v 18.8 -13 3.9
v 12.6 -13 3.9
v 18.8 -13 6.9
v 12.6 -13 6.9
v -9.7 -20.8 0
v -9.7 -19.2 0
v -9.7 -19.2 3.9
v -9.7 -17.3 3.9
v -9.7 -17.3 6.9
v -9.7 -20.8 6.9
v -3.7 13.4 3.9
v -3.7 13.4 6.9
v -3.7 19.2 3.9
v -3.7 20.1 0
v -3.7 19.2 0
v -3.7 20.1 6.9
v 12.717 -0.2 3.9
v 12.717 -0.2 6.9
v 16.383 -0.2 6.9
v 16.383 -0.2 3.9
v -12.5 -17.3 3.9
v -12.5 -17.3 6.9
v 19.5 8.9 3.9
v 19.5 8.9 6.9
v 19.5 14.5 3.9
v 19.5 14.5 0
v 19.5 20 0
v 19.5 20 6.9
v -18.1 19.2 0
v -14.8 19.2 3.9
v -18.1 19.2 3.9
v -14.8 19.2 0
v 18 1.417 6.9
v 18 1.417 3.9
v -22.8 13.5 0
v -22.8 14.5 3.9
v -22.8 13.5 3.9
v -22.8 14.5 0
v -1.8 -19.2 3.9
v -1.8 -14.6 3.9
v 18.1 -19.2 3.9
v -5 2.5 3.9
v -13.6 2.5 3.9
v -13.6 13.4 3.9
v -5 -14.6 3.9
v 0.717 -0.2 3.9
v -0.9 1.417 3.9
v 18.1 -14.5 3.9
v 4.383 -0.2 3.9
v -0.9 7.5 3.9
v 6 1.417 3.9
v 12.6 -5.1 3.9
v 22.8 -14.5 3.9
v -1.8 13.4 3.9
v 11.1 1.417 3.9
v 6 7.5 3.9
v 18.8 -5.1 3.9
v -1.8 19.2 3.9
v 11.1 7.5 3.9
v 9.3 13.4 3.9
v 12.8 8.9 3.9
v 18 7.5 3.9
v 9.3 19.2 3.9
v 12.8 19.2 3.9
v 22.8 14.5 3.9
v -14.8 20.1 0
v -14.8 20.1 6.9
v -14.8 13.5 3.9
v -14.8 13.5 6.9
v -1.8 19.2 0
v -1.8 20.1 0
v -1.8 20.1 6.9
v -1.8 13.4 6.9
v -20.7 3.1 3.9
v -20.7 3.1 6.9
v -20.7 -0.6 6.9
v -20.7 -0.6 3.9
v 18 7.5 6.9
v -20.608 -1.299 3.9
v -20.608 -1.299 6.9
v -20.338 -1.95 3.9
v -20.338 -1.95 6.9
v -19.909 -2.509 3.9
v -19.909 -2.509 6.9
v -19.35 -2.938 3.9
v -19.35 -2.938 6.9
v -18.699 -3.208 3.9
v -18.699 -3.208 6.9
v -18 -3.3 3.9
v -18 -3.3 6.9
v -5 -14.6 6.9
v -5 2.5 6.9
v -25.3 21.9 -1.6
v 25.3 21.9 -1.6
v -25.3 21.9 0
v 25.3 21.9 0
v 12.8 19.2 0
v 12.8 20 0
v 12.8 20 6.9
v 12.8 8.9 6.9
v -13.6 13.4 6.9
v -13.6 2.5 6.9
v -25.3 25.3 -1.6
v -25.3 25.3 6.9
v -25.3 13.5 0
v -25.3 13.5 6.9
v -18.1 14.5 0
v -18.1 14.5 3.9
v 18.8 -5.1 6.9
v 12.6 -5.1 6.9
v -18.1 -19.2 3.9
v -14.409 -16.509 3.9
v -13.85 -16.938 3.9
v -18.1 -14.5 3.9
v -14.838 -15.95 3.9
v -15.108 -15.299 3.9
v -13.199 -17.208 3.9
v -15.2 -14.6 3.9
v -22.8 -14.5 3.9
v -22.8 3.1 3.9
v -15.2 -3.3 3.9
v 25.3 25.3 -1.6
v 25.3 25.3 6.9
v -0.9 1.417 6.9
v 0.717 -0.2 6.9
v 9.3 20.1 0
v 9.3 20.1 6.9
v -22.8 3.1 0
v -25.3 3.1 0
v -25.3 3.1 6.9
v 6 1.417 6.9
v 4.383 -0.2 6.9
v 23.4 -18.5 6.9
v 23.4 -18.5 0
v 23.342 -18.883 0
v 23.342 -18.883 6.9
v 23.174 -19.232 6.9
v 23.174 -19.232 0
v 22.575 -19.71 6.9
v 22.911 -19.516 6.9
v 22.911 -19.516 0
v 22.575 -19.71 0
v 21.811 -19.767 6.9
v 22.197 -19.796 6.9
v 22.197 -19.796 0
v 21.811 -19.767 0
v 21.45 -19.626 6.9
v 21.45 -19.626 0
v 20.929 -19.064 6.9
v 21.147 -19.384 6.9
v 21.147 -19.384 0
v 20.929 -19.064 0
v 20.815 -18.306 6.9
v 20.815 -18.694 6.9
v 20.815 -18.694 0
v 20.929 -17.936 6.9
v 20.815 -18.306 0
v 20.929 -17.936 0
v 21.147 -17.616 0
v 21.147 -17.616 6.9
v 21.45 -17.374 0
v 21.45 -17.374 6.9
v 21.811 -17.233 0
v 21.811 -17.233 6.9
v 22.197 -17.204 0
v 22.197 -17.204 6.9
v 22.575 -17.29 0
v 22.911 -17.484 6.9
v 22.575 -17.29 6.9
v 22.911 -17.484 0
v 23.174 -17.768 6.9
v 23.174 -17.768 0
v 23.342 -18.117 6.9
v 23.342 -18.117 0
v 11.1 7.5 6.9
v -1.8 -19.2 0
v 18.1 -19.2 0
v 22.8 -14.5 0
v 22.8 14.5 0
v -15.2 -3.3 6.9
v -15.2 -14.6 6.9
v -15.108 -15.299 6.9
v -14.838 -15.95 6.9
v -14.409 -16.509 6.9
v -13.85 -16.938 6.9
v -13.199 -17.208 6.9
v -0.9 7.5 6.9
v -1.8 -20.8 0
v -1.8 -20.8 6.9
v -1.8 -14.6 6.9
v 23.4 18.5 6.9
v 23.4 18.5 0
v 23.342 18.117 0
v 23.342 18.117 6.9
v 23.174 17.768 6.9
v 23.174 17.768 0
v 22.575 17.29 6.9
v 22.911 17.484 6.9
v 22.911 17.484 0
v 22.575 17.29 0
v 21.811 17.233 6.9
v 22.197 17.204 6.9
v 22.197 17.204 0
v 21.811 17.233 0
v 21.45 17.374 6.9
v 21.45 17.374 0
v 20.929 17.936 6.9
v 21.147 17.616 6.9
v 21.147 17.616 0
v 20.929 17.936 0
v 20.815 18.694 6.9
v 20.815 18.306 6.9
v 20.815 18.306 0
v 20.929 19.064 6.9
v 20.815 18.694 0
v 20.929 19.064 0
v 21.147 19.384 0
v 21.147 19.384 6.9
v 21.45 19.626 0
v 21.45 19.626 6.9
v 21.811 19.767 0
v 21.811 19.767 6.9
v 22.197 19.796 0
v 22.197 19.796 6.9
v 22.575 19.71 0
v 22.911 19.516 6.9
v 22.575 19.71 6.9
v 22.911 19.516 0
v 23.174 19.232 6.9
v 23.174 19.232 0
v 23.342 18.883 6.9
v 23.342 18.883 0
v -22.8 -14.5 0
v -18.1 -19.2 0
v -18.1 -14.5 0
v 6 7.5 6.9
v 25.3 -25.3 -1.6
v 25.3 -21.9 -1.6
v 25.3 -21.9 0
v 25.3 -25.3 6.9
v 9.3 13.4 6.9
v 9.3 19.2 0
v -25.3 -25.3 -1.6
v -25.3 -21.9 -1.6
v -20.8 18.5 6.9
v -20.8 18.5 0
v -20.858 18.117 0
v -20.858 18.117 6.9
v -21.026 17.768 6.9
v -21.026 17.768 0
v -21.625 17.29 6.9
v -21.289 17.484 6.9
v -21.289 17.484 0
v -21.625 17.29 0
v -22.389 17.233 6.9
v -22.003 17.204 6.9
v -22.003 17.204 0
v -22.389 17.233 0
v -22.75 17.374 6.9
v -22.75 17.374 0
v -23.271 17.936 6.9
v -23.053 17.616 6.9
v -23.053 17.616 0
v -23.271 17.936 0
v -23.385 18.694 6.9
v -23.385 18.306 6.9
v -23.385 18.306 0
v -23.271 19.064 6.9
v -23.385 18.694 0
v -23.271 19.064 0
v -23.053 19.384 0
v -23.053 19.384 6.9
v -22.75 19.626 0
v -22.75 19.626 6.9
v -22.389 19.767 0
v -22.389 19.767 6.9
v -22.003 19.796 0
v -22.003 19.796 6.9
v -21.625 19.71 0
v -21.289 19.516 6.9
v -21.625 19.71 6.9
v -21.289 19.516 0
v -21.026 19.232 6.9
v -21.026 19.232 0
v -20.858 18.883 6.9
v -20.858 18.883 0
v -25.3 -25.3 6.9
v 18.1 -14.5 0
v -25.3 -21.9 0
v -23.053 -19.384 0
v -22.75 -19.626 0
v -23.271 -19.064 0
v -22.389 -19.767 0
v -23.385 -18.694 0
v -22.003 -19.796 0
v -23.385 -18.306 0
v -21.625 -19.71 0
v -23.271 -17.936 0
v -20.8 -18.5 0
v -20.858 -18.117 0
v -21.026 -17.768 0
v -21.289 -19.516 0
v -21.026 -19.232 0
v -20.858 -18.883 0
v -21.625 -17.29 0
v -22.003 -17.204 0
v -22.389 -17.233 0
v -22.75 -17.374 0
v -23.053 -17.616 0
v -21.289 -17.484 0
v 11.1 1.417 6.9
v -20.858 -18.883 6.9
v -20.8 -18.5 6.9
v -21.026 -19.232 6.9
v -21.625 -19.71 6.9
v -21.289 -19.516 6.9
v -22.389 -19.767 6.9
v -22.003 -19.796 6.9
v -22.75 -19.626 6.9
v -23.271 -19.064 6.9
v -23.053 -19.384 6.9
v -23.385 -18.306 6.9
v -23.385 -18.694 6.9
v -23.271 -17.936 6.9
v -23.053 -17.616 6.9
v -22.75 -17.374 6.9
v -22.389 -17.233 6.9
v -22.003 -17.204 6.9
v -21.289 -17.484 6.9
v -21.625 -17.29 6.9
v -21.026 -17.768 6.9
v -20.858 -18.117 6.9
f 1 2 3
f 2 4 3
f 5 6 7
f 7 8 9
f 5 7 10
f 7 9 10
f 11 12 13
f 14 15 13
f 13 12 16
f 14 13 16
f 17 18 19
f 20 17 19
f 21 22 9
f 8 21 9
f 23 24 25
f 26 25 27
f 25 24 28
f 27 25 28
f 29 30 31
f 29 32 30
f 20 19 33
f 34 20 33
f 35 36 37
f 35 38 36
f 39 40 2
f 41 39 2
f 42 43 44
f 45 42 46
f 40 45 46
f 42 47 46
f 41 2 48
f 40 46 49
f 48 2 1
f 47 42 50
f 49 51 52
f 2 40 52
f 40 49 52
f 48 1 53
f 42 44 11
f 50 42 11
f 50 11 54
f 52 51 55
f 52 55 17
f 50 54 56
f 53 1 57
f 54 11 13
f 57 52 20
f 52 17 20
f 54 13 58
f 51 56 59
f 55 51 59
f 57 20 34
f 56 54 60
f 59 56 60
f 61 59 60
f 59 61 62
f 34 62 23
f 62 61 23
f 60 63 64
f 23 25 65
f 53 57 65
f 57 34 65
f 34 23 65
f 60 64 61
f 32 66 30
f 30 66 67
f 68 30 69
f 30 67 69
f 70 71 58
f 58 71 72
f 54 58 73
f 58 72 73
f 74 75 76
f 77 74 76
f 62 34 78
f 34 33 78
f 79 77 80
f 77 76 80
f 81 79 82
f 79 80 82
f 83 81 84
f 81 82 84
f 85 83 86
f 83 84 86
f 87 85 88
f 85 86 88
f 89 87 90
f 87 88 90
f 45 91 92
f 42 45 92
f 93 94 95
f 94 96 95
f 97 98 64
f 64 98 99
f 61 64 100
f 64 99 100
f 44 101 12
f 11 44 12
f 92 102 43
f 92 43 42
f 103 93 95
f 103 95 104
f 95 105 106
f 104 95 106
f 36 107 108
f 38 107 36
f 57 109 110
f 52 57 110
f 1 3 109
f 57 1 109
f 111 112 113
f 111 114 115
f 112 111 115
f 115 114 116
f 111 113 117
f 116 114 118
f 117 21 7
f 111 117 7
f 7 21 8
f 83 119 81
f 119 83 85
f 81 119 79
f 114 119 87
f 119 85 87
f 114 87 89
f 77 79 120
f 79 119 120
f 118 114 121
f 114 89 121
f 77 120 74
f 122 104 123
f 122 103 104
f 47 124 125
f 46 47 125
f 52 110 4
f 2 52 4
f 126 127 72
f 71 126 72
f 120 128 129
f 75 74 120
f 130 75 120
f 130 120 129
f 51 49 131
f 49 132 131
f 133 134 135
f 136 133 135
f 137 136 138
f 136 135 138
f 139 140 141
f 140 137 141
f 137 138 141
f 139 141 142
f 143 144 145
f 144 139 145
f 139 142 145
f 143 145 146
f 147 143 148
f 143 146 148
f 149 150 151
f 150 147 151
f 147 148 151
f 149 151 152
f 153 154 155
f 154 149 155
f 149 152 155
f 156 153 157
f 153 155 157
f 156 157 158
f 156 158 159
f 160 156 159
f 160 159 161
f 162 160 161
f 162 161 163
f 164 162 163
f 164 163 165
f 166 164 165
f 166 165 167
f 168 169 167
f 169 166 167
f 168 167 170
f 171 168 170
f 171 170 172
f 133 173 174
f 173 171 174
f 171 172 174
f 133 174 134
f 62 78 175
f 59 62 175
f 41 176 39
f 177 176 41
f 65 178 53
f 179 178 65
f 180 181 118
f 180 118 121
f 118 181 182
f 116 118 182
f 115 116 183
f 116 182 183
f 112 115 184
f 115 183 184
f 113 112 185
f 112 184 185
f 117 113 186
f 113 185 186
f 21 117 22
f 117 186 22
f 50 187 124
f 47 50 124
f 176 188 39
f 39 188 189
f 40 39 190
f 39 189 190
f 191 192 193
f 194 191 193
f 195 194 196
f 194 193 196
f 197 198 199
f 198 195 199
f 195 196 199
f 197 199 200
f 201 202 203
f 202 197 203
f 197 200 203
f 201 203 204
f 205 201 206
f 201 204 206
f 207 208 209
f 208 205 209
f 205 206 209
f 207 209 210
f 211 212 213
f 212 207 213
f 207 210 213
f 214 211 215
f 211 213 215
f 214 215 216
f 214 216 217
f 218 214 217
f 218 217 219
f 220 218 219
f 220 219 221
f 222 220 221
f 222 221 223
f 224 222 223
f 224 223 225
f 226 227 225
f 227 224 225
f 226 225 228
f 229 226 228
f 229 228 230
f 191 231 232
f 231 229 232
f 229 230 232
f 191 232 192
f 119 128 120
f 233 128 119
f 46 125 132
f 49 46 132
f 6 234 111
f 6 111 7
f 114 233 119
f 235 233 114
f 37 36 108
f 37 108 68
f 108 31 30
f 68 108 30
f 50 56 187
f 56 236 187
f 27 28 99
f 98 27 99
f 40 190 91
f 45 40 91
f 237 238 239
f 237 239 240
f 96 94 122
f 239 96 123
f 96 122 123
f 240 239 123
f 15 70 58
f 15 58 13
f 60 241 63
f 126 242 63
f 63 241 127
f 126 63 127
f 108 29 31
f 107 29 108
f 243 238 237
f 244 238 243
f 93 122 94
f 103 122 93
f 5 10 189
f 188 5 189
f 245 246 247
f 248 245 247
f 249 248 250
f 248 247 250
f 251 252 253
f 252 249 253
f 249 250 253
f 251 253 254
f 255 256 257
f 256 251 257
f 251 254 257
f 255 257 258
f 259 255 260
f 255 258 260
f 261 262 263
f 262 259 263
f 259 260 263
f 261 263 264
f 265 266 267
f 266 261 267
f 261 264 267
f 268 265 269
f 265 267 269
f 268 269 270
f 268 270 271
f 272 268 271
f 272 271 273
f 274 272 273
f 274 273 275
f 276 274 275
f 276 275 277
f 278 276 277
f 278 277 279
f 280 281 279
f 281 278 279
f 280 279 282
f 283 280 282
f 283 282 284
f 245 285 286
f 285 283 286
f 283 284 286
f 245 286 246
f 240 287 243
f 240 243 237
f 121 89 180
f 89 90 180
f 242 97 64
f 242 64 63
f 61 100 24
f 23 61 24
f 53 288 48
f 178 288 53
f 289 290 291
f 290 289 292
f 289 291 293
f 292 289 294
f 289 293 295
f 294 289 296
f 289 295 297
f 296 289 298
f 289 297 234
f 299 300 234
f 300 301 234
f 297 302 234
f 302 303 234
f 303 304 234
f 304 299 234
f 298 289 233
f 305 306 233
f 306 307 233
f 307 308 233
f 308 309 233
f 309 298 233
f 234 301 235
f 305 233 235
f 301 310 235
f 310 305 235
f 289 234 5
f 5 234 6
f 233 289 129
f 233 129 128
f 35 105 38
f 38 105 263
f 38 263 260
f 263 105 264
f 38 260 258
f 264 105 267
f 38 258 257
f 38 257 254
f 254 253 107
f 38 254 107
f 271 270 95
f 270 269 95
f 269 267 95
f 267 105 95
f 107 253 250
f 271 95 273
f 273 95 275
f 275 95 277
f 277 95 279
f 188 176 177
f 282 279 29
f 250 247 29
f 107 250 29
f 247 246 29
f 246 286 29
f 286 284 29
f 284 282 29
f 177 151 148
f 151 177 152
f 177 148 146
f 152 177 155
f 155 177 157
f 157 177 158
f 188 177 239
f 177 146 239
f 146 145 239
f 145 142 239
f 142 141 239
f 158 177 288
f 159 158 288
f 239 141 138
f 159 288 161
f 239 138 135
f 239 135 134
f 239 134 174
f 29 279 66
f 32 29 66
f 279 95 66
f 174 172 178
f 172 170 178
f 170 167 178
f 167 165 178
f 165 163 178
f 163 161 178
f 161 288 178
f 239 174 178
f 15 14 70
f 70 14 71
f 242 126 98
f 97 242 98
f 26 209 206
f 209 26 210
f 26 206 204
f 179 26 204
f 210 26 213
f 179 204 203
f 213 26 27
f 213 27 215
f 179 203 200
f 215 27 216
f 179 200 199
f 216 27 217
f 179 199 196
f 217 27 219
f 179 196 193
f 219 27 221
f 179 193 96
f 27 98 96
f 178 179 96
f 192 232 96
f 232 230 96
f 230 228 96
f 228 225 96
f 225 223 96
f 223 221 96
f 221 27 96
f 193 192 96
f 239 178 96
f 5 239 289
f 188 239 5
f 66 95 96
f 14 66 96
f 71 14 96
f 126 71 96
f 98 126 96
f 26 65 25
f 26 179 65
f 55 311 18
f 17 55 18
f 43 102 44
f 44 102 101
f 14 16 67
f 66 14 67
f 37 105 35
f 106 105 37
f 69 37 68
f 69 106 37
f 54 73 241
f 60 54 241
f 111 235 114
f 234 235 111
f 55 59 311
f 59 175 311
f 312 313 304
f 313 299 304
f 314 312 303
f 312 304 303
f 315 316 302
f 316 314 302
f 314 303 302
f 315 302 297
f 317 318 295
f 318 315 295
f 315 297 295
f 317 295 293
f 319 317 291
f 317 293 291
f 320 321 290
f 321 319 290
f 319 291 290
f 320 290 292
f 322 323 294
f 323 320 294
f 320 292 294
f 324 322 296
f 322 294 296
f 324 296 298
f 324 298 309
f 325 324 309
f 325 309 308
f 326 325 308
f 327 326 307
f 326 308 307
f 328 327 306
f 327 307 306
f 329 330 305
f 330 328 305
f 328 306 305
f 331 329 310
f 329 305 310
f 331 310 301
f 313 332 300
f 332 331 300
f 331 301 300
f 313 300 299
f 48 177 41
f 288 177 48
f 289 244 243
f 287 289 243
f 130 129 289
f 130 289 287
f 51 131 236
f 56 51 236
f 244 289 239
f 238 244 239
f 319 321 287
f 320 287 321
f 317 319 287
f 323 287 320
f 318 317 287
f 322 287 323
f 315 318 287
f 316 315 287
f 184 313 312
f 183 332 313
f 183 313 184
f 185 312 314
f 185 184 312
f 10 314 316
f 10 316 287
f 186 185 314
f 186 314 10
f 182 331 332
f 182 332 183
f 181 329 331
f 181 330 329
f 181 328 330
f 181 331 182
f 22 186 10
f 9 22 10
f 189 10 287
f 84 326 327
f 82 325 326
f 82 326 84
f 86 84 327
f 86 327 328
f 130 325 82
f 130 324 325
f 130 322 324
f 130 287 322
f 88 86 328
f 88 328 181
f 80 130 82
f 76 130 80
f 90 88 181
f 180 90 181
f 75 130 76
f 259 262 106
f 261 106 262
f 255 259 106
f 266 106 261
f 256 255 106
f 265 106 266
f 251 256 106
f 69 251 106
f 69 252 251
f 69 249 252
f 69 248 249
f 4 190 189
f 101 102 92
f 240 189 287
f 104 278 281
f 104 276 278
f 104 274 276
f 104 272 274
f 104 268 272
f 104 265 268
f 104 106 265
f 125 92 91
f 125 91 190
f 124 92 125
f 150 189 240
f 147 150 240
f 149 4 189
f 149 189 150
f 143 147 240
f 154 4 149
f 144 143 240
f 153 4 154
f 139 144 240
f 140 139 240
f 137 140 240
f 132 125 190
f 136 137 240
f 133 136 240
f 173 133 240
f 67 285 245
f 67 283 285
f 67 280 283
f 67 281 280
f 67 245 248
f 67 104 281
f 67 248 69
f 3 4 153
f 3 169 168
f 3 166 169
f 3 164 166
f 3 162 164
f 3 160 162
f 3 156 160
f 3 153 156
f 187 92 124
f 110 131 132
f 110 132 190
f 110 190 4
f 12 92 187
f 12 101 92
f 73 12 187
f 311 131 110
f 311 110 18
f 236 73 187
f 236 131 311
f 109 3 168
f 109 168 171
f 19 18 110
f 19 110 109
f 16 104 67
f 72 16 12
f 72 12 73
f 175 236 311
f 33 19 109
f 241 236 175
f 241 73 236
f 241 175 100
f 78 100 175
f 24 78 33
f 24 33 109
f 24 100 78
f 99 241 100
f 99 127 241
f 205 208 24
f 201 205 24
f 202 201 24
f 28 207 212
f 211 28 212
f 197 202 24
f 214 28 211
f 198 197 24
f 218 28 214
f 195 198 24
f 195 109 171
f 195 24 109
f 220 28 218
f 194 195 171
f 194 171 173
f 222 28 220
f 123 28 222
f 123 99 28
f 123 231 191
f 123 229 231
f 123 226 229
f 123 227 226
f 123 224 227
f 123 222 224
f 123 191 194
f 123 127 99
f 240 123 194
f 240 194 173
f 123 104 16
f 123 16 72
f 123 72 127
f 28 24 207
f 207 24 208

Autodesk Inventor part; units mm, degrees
ref_plane "YZ Plane" through (0, 0, 0) normal (1, 0, 0) x (0, 1, 0)
ref_plane "XZ Plane" through (0, 0, 0) normal (0, 1, 0) x (-1, 0, 0)
ref_plane "XY Plane" through (0, 0, 0) normal (0, 0, 1) x (1, 0, 0)
sketch "スケッチ1" plane through (0, 0, 0) normal (0, 0, 1) x (1, 0, 0)
  line L0 (-25.3, 21.7) -> (25.3, 21.7)
  line L1 (25.3, 21.7) -> (25.3, -21.7)
  line L2 (25.3, -21.7) -> (-25.3, -21.7)
  line L3 (-25.3, -21.7) -> (-25.3, 21.7)
  circle A0 centre (-22.1, 18.5) radius 1.3
  circle A1 centre (22.1, 18.5) radius 1.3
  circle A2 centre (22.1, -18.5) radius 1.3
  circle A3 centre (-22.1, -18.5) radius 1.3
  line L4 (-18.1, 19.2) -> (-18.1, 14.5)
  line L5 (-18.1, 14.5) -> (-22.8, 14.5)
  line L6 (-22.8, 14.5) -> (-22.8, -14.5)
  line L7 (-22.8, -14.5) -> (-18.1, -14.5)
  line L8 (-18.1, -14.5) -> (-18.1, -19.2)
  line L9 (-18.1, -19.2) -> (18.1, -19.2)
  line L10 (18.1, -19.2) -> (18.1, -14.5)
  line L11 (18.1, -14.5) -> (22.8, -14.5)
  line L12 (22.8, -14.5) -> (22.8, 14.5)
  line L13 (22.8, 14.5) -> (18.1, 14.5)
  line L14 (18.1, 14.5) -> (18.1, 19.2)
  line L15 (18.1, 19.2) -> (-18.1, 19.2)
  point P0 (0, 0)
  point P1 (0, 21.7)
  point P2 (-25.3, 0)
  dimension "d0" = 50.6
  dimension "d1" = 43.4
  dimension "d2" = 2.6
  dimension "d3" = 44.2
  dimension "d4" = 37
  dimension "d5" = 22.1
  dimension "d6" = 18.5
  dimension "d7" = 2.5
  dimension "d8" = 2.5
  dimension "d9" = 2.5
  dimension "d10" = 2.5
  dimension "d11" = 4
  dimension "d12" = 4
  dimension "d13" = 4
  dimension "d14" = 4
  dimension "d15" = 4
extrude "押し出し1" add sketch "スケッチ1" along normal blind 6.9
sketch "スケッチ4" plane through (0, 0, 6.9) normal (0, 0, 1) x (1, 0, 0)
  line L0 (-18.1, 14.5) -> (-18.1, 19.2) projected
  line L1 (-18.1, 19.2) -> (18.1, 19.2) projected
  line L2 (-22.8, 14.5) -> (-18.1, 14.5) projected
  line L3 (-22.8, -14.5) -> (-22.8, 14.5) projected
  line L4 (-18.1, -14.5) -> (-22.8, -14.5) projected
  line L5 (-18.1, -19.2) -> (-18.1, -14.5) projected
  line L6 (18.1, -19.2) -> (-18.1, -19.2) projected
  line L7 (18.1, -14.5) -> (18.1, -19.2) projected
  line L8 (22.8, -14.5) -> (18.1, -14.5) projected
  line L9 (22.8, 14.5) -> (22.8, -14.5) projected
  line L10 (18.1, 14.5) -> (22.8, 14.5) projected
  line L11 (18.1, 19.2) -> (18.1, 14.5) projected
  point P0 (0, 0)
extrude "押し出し4" add sketch "スケッチ4" against normal blind 3
sketch "スケッチ3" plane through (0, 0, 6.9) normal (0, 0, 1) x (1, 0, 0)
  line L0 (-14.6, 19.9) -> (-3.9, 19.9) construction
  line L1 (-3.9, 19.9) -> (-3.9, 13.6) construction
  line L2 (-3.9, 13.6) -> (-14.6, 13.6) construction
  line L3 (-14.6, 13.6) -> (-14.6, 19.9) construction
  line L4 (-1.6, 19.9) -> (9.1, 19.9) construction
  line L5 (9.1, 19.9) -> (9.1, 13.6) construction
  line L6 (9.1, 13.6) -> (-1.6, 13.6) construction
  line L7 (-1.6, 13.6) -> (-1.6, 19.9) construction
  line L8 (13, 19.8) -> (19.3, 19.8) construction
  line L9 (19.3, 19.8) -> (19.3, 9.1) construction
  line L10 (19.3, 9.1) -> (13, 9.1) construction
  line L11 (13, 9.1) -> (13, 19.8) construction
  line L12 (25.3, 21.7) -> (-25.3, 21.7) construction
  line L13 (25.3, -21.7) -> (25.3, 21.7) construction
  line L14 (-14.8, 13.4) -> (-3.7, 13.4)
  line L15 (-3.7, 13.4) -> (-3.7, 20.1)
  line L16 (-3.7, 20.1) -> (-14.8, 20.1)
  line L17 (-14.8, 20.1) -> (-14.8, 13.4)
  line L18 (-1.8, 13.4) -> (9.3, 13.4)
  line L19 (9.3, 13.4) -> (9.3, 20.1)
  line L20 (9.3, 20.1) -> (-1.8, 20.1)
  line L21 (-1.8, 20.1) -> (-1.8, 13.4)
  line L22 (12.8, 8.9) -> (19.5, 8.9)
  line L23 (19.5, 8.9) -> (19.5, 20)
  line L24 (19.5, 20) -> (12.8, 20)
  line L25 (12.8, 20) -> (12.8, 8.9)
  point P0 (0, 0)
  dimension "d20" = 6.3
  dimension "d21" = 10.7
  dimension "d23" = 6
  dimension "d24" = 1.8
  dimension "d25" = 26.9
  dimension "d26" = 39.9
  dimension "d27" = 12.6
  dimension "d28" = 0.2
  dimension "d29" = 0.2
  dimension "d30" = 0.2
extrude "押し出し3" cut sketch "スケッチ3" along normal through all both and the other way through all
sketch "スケッチ5" plane through (0, 0, 6.9) normal (0, 0, 1) x (1, 0, 0)
  line L0 (-21.5, 13.3) -> (-13.8, 13.3) construction
  line L1 (-13.8, 13.3) -> (-13.8, 3.3) construction
  line L2 (-13.8, 3.3) -> (-21.5, 3.3) construction
  line L3 (-21.5, 3.3) -> (-21.5, 13.3) construction
  line L4 (25.3, 21.7) -> (-25.3, 21.7) construction
  line L5 (25.3, -21.7) -> (25.3, 21.7) construction
  line L6 (-25.3, 13.5) -> (-13.6, 13.5)
  line L7 (-13.6, 13.5) -> (-13.6, 3.1)
  line L8 (-13.6, 3.1) -> (-25.3, 3.1)
  line L9 (-25.3, 3.1) -> (-25.3, 13.5)
  line L10 (-25.3, 21.7) -> (-25.3, -21.7) construction
  point P0 (0, 0)
  dimension "d35" = 46.8
  dimension "d36" = 7.7
  dimension "d37" = 18.4
  dimension "d38" = 10
  dimension "d39" = 0.2
  dimension "d40" = 0.2
  dimension "d41" = 0.2
extrude "押し出し5" cut sketch "スケッチ5" against normal through all
sketch "スケッチ6" plane through (0, 0, 6.9) normal (0, 0, 1) x (1, 0, 0)
  line L0 (-5.2, 2.3) -> (-15, 2.3) construction
  line L1 (-15, 2.3) -> (-15, -11.9) construction
  line L2 (-15, -11.9) -> (-5.2, -11.9) construction
  line L3 (-5.2, -11.9) -> (-5.2, 2.3) construction
  line L4 (25.3, 21.7) -> (-25.3, 21.7) construction
  line L5 (25.3, -21.7) -> (25.3, 21.7) construction
  line L6 (-15.2, 2.5) -> (-5, 2.5)
  line L7 (-5, 2.5) -> (-5, -12.1)
  line L8 (-5, -12.1) -> (-15.2, -12.1)
  line L9 (-15.2, -12.1) -> (-15.2, 2.5)
  point P0 (0, 0)
  dimension "d44" = 14.2
  dimension "d45" = 9.8
  dimension "d46" = 40.3
  dimension "d47" = 33.6
  dimension "d48" = 0.2
extrude "押し出し6" cut sketch "スケッチ6" against normal through all
sketch "スケッチ7" plane through (0, 0, 6.9) normal (0, 0, 1) x (1, 0, 0)
  line L0 (25.3, 21.7) -> (-25.3, 21.7) construction
  line L1 (25.3, -21.7) -> (25.3, 21.7) construction
  line L2 (12.8, -5.3) -> (18.6, -5.3) construction
  line L3 (18.6, -5.3) -> (18.6, -12.8) construction
  line L4 (18.6, -12.8) -> (12.8, -12.8) construction
  line L5 (12.8, -12.8) -> (12.8, -5.3) construction
  line L6 (-9.5, -14.8) -> (-2, -14.8) construction
  line L7 (-2, -14.8) -> (-2, -20.6) construction
  line L8 (-2, -20.6) -> (-9.5, -20.6) construction
  line L9 (-9.5, -20.6) -> (-9.5, -14.8) construction
  line L10 (12.6, -13) -> (18.8, -13)
  line L11 (18.8, -13) -> (18.8, -5.1)
  line L12 (18.8, -5.1) -> (12.6, -5.1)
  line L13 (12.6, -5.1) -> (12.6, -13)
  line L14 (-1.8, -20.8) -> (-1.8, -14.6)
  line L15 (-1.8, -14.6) -> (-9.7, -14.6)
  line L16 (-9.7, -14.6) -> (-9.7, -20.8)
  line L17 (-9.7, -20.8) -> (-1.8, -20.8)
  point P0 (0, 0)
  dimension "d51" = 7.5
  dimension "d52" = 5.8
  dimension "d53" = 12.5
  dimension "d54" = 34.5
  dimension "d55" = 42.3
  dimension "d56" = 34.8
  dimension "d57" = 0.2
  dimension "d58" = 0.2
extrude "押し出し7" cut sketch "スケッチ7" against normal through all
sketch "スケッチ8" plane through (0, 0, 6.9) normal (0, 0, 1) x (1, 0, 0)
  circle A0 centre (-18, -0.6) radius 2.5 construction
  circle A1 centre (-12.5, -14.6) radius 2.5 construction
  line L0 (25.3, 21.7) -> (-25.3, 21.7) construction
  line L1 (25.3, -21.7) -> (25.3, 21.7) construction
  circle A2 centre (-18, -0.6) radius 2.7
  circle A3 centre (-12.5, -14.6) radius 2.7
  point P0 (0, 0)
  dimension "d61" = 5
  dimension "d62" = 22.3
  dimension "d63" = 36.3
  dimension "d64" = 43.3
  dimension "d65" = 37.8
  dimension "d66" = 0.2
  dimension "d67" = 0.2
extrude "押し出し8" cut sketch "スケッチ8" against normal through all
sketch "スケッチ9" plane through (0, 0, 6.9) normal (0, 0, 1) x (1, 0, 0)
  line L0 (11.3, 1.5) -> (11.3, 7.3) construction
  line L1 (11.3, 7.3) -> (17.8, 7.3) construction
  line L2 (17.8, 7.3) -> (17.8, 1.5) construction
  line L3 (17.8, 1.5) -> (16.3, 0) construction
  line L4 (16.3, 0) -> (12.8, 0) construction
  line L5 (12.8, 0) -> (11.3, 1.5) construction
  line L6 (-0.7, 1.5) -> (-0.7, 7.3) construction
  line L7 (-0.7, 7.3) -> (5.8, 7.3) construction
  line L8 (5.8, 7.3) -> (5.8, 1.5) construction
  line L9 (5.8, 1.5) -> (4.3, 0) construction
  line L10 (4.3, 0) -> (0.8, 0) construction
  line L11 (0.8, 0) -> (-0.7, 1.5) construction
  line L12 (25.3, -21.7) -> (25.3, 21.7) construction
  line L13 (25.3, 21.7) -> (-25.3, 21.7) construction
  line L14 (6, 7.5) -> (-0.9, 7.5)
  line L15 (-0.9, 7.5) -> (-0.9, 1.4172)
  line L16 (-0.9, 1.4172) -> (0.7172, -0.2)
  line L17 (0.7172, -0.2) -> (4.3828, -0.2)
  line L18 (4.3828, -0.2) -> (6, 1.4172)
  line L19 (6, 1.4172) -> (6, 7.5)
  line L20 (18, 7.5) -> (11.1, 7.5)
  line L21 (11.1, 7.5) -> (11.1, 1.4172)
  line L22 (11.1, 1.4172) -> (12.7172, -0.2)
  line L23 (12.7172, -0.2) -> (16.3828, -0.2)
  line L24 (16.3828, -0.2) -> (18, 1.4172)
  line L25 (18, 1.4172) -> (18, 7.5)
  point P0 (0, 0)
  dimension "d70" = 135
  dimension "d71" = 135
  dimension "d72" = 135
  dimension "d73" = 135
  dimension "d74" = 7.3
  dimension "d75" = 6.5
  dimension "d76" = 1.5
  dimension "d77" = 26
  dimension "d78" = 14
  dimension "d79" = 21.7
  dimension "d80" = 0.2
  dimension "d81" = 0.2
extrude "押し出し9" cut sketch "スケッチ9" against normal through all
sketch "スケッチ10" plane through (0, 0, 6.9) normal (0, 0, 1) x (1, 0, 0)
  arc A0 (-13.5198, -12.1) -> (-11.4802, -12.1) centre (-12.5, -14.6) ccw construction
  circle A1 centre (-18, -0.6) radius 2.7 construction
  line L0 (-13.6, 13.4) -> (-13.6, 3.1) construction
  line L1 (-15.2, -12.1) -> (-15.2, 2.5) construction
  line L2 (-9.7, -14.6) -> (-1.8, -14.6) construction
  line L3 (-12.5, -14.6) -> (-15.2, -14.6) construction
  line L4 (-5, -14.6881) -> (-5, -8.3419)
  line L5 (-5, -8.3419) -> (-15.2, -8.3419)
  line L6 (-15.2, -8.3419) -> (-15.2, -14.6)
  line L7 (-15.2, -14.6) -> (-12.5, -14.6)
  line L8 (-12.5, -14.6) -> (-12.5, -17.3)
  line L9 (-12.5, -17.3) -> (-5, -17.3)
  line L10 (-5, -17.3) -> (-5, -14.6881)
  line L11 (-9.7, -20.8) -> (-9.7, -14.6) construction
  line L12 (-20.7, 3.1) -> (-20.7, -0.6)
  line L13 (-20.7, -0.6) -> (-18, -0.6)
  line L14 (-18, -0.6) -> (-18, -3.3)
  line L15 (-18, -3.3) -> (-13.6, -3.3)
  line L16 (-13.6, -3.3) -> (-13.6, 3.1)
  line L17 (-13.6, 3.1) -> (-20.7, 3.1)
  point P0 (0, 0)
  point P1 (-5, -12.1)
extrude "押し出し10" cut sketch "スケッチ10" against normal through all
sketch "スケッチ11" plane through (-25.3, 21.7, 0) normal (0, 1, 0) x (1, 0, 0)
  line L0 (50.6, -6.9) -> (0, -6.9) projected
  line L1 (50.6, 0) -> (50.6, -6.9) projected
  line L2 (50.6, 0) -> (0, 0) projected
  line L3 (0, 0) -> (0, -6.9) projected
  point P0 (25.3, 0)
extrude "押し出し11" add sketch "スケッチ11" along normal blind 3.6
sketch "スケッチ12" plane through (-25.3, -21.7, 0) normal (0, -1, 0) x (1, 0, 0)
  line L0 (0, 0) -> (0, 6.9) projected
  line L1 (0, 0) -> (50.6, 0) projected
  line L2 (0, 6.9) -> (50.6, 6.9) projected
  line L3 (50.6, 0) -> (50.6, 6.9) projected
  point P0 (25.3, 0)
extrude "押し出し12" add sketch "スケッチ12" along normal blind 3.6
sketch "スケッチ13" plane through (0, 0, 0) normal (0, 0, -1) x (-1, 0, 0)
  line L0 (-25.3, 25.3) -> (25.3, 25.3) projected
  line L1 (25.3, -25.3) -> (-25.3, -25.3) projected
  line L2 (-25.3, 21.9) -> (25.3, 21.9)
  line L3 (25.3, -21.9) -> (-25.3, -21.9)
  line L4 (25.3, 21.9) -> (25.3, 25.3)
  line L5 (-25.3, 25.3) -> (-25.3, 21.9)
  line L6 (25.3, -21.9) -> (25.3, -25.3)
  line L7 (-25.3, -21.9) -> (-25.3, -25.3)
  point P0 (0, 0)
  dimension "d90" = 3.4
  dimension "d91" = 3.4
extrude "押し出し13" add sketch "スケッチ13" along normal blind 1.6
equation "\"d5\" = 0.5 * d3"
equation "\"d6\" = 0.5 * d4"
equation "\"d8\" = d7"
equation "\"d9\" = d7"
equation "\"d10\" = d7"
equation "\"d12\" = d11"
equation "\"d13\" = d11"
equation "\"d14\" = d11"
equation "\"d15\" = d11"
equation "\"d40\" = d39"
equation "\"d41\" = d39"
equation "\"d71\" = d70"
equation "\"d73\" = d72"
equation "\"d81\" = d80"
properties part number "fan_controller_case_top"
